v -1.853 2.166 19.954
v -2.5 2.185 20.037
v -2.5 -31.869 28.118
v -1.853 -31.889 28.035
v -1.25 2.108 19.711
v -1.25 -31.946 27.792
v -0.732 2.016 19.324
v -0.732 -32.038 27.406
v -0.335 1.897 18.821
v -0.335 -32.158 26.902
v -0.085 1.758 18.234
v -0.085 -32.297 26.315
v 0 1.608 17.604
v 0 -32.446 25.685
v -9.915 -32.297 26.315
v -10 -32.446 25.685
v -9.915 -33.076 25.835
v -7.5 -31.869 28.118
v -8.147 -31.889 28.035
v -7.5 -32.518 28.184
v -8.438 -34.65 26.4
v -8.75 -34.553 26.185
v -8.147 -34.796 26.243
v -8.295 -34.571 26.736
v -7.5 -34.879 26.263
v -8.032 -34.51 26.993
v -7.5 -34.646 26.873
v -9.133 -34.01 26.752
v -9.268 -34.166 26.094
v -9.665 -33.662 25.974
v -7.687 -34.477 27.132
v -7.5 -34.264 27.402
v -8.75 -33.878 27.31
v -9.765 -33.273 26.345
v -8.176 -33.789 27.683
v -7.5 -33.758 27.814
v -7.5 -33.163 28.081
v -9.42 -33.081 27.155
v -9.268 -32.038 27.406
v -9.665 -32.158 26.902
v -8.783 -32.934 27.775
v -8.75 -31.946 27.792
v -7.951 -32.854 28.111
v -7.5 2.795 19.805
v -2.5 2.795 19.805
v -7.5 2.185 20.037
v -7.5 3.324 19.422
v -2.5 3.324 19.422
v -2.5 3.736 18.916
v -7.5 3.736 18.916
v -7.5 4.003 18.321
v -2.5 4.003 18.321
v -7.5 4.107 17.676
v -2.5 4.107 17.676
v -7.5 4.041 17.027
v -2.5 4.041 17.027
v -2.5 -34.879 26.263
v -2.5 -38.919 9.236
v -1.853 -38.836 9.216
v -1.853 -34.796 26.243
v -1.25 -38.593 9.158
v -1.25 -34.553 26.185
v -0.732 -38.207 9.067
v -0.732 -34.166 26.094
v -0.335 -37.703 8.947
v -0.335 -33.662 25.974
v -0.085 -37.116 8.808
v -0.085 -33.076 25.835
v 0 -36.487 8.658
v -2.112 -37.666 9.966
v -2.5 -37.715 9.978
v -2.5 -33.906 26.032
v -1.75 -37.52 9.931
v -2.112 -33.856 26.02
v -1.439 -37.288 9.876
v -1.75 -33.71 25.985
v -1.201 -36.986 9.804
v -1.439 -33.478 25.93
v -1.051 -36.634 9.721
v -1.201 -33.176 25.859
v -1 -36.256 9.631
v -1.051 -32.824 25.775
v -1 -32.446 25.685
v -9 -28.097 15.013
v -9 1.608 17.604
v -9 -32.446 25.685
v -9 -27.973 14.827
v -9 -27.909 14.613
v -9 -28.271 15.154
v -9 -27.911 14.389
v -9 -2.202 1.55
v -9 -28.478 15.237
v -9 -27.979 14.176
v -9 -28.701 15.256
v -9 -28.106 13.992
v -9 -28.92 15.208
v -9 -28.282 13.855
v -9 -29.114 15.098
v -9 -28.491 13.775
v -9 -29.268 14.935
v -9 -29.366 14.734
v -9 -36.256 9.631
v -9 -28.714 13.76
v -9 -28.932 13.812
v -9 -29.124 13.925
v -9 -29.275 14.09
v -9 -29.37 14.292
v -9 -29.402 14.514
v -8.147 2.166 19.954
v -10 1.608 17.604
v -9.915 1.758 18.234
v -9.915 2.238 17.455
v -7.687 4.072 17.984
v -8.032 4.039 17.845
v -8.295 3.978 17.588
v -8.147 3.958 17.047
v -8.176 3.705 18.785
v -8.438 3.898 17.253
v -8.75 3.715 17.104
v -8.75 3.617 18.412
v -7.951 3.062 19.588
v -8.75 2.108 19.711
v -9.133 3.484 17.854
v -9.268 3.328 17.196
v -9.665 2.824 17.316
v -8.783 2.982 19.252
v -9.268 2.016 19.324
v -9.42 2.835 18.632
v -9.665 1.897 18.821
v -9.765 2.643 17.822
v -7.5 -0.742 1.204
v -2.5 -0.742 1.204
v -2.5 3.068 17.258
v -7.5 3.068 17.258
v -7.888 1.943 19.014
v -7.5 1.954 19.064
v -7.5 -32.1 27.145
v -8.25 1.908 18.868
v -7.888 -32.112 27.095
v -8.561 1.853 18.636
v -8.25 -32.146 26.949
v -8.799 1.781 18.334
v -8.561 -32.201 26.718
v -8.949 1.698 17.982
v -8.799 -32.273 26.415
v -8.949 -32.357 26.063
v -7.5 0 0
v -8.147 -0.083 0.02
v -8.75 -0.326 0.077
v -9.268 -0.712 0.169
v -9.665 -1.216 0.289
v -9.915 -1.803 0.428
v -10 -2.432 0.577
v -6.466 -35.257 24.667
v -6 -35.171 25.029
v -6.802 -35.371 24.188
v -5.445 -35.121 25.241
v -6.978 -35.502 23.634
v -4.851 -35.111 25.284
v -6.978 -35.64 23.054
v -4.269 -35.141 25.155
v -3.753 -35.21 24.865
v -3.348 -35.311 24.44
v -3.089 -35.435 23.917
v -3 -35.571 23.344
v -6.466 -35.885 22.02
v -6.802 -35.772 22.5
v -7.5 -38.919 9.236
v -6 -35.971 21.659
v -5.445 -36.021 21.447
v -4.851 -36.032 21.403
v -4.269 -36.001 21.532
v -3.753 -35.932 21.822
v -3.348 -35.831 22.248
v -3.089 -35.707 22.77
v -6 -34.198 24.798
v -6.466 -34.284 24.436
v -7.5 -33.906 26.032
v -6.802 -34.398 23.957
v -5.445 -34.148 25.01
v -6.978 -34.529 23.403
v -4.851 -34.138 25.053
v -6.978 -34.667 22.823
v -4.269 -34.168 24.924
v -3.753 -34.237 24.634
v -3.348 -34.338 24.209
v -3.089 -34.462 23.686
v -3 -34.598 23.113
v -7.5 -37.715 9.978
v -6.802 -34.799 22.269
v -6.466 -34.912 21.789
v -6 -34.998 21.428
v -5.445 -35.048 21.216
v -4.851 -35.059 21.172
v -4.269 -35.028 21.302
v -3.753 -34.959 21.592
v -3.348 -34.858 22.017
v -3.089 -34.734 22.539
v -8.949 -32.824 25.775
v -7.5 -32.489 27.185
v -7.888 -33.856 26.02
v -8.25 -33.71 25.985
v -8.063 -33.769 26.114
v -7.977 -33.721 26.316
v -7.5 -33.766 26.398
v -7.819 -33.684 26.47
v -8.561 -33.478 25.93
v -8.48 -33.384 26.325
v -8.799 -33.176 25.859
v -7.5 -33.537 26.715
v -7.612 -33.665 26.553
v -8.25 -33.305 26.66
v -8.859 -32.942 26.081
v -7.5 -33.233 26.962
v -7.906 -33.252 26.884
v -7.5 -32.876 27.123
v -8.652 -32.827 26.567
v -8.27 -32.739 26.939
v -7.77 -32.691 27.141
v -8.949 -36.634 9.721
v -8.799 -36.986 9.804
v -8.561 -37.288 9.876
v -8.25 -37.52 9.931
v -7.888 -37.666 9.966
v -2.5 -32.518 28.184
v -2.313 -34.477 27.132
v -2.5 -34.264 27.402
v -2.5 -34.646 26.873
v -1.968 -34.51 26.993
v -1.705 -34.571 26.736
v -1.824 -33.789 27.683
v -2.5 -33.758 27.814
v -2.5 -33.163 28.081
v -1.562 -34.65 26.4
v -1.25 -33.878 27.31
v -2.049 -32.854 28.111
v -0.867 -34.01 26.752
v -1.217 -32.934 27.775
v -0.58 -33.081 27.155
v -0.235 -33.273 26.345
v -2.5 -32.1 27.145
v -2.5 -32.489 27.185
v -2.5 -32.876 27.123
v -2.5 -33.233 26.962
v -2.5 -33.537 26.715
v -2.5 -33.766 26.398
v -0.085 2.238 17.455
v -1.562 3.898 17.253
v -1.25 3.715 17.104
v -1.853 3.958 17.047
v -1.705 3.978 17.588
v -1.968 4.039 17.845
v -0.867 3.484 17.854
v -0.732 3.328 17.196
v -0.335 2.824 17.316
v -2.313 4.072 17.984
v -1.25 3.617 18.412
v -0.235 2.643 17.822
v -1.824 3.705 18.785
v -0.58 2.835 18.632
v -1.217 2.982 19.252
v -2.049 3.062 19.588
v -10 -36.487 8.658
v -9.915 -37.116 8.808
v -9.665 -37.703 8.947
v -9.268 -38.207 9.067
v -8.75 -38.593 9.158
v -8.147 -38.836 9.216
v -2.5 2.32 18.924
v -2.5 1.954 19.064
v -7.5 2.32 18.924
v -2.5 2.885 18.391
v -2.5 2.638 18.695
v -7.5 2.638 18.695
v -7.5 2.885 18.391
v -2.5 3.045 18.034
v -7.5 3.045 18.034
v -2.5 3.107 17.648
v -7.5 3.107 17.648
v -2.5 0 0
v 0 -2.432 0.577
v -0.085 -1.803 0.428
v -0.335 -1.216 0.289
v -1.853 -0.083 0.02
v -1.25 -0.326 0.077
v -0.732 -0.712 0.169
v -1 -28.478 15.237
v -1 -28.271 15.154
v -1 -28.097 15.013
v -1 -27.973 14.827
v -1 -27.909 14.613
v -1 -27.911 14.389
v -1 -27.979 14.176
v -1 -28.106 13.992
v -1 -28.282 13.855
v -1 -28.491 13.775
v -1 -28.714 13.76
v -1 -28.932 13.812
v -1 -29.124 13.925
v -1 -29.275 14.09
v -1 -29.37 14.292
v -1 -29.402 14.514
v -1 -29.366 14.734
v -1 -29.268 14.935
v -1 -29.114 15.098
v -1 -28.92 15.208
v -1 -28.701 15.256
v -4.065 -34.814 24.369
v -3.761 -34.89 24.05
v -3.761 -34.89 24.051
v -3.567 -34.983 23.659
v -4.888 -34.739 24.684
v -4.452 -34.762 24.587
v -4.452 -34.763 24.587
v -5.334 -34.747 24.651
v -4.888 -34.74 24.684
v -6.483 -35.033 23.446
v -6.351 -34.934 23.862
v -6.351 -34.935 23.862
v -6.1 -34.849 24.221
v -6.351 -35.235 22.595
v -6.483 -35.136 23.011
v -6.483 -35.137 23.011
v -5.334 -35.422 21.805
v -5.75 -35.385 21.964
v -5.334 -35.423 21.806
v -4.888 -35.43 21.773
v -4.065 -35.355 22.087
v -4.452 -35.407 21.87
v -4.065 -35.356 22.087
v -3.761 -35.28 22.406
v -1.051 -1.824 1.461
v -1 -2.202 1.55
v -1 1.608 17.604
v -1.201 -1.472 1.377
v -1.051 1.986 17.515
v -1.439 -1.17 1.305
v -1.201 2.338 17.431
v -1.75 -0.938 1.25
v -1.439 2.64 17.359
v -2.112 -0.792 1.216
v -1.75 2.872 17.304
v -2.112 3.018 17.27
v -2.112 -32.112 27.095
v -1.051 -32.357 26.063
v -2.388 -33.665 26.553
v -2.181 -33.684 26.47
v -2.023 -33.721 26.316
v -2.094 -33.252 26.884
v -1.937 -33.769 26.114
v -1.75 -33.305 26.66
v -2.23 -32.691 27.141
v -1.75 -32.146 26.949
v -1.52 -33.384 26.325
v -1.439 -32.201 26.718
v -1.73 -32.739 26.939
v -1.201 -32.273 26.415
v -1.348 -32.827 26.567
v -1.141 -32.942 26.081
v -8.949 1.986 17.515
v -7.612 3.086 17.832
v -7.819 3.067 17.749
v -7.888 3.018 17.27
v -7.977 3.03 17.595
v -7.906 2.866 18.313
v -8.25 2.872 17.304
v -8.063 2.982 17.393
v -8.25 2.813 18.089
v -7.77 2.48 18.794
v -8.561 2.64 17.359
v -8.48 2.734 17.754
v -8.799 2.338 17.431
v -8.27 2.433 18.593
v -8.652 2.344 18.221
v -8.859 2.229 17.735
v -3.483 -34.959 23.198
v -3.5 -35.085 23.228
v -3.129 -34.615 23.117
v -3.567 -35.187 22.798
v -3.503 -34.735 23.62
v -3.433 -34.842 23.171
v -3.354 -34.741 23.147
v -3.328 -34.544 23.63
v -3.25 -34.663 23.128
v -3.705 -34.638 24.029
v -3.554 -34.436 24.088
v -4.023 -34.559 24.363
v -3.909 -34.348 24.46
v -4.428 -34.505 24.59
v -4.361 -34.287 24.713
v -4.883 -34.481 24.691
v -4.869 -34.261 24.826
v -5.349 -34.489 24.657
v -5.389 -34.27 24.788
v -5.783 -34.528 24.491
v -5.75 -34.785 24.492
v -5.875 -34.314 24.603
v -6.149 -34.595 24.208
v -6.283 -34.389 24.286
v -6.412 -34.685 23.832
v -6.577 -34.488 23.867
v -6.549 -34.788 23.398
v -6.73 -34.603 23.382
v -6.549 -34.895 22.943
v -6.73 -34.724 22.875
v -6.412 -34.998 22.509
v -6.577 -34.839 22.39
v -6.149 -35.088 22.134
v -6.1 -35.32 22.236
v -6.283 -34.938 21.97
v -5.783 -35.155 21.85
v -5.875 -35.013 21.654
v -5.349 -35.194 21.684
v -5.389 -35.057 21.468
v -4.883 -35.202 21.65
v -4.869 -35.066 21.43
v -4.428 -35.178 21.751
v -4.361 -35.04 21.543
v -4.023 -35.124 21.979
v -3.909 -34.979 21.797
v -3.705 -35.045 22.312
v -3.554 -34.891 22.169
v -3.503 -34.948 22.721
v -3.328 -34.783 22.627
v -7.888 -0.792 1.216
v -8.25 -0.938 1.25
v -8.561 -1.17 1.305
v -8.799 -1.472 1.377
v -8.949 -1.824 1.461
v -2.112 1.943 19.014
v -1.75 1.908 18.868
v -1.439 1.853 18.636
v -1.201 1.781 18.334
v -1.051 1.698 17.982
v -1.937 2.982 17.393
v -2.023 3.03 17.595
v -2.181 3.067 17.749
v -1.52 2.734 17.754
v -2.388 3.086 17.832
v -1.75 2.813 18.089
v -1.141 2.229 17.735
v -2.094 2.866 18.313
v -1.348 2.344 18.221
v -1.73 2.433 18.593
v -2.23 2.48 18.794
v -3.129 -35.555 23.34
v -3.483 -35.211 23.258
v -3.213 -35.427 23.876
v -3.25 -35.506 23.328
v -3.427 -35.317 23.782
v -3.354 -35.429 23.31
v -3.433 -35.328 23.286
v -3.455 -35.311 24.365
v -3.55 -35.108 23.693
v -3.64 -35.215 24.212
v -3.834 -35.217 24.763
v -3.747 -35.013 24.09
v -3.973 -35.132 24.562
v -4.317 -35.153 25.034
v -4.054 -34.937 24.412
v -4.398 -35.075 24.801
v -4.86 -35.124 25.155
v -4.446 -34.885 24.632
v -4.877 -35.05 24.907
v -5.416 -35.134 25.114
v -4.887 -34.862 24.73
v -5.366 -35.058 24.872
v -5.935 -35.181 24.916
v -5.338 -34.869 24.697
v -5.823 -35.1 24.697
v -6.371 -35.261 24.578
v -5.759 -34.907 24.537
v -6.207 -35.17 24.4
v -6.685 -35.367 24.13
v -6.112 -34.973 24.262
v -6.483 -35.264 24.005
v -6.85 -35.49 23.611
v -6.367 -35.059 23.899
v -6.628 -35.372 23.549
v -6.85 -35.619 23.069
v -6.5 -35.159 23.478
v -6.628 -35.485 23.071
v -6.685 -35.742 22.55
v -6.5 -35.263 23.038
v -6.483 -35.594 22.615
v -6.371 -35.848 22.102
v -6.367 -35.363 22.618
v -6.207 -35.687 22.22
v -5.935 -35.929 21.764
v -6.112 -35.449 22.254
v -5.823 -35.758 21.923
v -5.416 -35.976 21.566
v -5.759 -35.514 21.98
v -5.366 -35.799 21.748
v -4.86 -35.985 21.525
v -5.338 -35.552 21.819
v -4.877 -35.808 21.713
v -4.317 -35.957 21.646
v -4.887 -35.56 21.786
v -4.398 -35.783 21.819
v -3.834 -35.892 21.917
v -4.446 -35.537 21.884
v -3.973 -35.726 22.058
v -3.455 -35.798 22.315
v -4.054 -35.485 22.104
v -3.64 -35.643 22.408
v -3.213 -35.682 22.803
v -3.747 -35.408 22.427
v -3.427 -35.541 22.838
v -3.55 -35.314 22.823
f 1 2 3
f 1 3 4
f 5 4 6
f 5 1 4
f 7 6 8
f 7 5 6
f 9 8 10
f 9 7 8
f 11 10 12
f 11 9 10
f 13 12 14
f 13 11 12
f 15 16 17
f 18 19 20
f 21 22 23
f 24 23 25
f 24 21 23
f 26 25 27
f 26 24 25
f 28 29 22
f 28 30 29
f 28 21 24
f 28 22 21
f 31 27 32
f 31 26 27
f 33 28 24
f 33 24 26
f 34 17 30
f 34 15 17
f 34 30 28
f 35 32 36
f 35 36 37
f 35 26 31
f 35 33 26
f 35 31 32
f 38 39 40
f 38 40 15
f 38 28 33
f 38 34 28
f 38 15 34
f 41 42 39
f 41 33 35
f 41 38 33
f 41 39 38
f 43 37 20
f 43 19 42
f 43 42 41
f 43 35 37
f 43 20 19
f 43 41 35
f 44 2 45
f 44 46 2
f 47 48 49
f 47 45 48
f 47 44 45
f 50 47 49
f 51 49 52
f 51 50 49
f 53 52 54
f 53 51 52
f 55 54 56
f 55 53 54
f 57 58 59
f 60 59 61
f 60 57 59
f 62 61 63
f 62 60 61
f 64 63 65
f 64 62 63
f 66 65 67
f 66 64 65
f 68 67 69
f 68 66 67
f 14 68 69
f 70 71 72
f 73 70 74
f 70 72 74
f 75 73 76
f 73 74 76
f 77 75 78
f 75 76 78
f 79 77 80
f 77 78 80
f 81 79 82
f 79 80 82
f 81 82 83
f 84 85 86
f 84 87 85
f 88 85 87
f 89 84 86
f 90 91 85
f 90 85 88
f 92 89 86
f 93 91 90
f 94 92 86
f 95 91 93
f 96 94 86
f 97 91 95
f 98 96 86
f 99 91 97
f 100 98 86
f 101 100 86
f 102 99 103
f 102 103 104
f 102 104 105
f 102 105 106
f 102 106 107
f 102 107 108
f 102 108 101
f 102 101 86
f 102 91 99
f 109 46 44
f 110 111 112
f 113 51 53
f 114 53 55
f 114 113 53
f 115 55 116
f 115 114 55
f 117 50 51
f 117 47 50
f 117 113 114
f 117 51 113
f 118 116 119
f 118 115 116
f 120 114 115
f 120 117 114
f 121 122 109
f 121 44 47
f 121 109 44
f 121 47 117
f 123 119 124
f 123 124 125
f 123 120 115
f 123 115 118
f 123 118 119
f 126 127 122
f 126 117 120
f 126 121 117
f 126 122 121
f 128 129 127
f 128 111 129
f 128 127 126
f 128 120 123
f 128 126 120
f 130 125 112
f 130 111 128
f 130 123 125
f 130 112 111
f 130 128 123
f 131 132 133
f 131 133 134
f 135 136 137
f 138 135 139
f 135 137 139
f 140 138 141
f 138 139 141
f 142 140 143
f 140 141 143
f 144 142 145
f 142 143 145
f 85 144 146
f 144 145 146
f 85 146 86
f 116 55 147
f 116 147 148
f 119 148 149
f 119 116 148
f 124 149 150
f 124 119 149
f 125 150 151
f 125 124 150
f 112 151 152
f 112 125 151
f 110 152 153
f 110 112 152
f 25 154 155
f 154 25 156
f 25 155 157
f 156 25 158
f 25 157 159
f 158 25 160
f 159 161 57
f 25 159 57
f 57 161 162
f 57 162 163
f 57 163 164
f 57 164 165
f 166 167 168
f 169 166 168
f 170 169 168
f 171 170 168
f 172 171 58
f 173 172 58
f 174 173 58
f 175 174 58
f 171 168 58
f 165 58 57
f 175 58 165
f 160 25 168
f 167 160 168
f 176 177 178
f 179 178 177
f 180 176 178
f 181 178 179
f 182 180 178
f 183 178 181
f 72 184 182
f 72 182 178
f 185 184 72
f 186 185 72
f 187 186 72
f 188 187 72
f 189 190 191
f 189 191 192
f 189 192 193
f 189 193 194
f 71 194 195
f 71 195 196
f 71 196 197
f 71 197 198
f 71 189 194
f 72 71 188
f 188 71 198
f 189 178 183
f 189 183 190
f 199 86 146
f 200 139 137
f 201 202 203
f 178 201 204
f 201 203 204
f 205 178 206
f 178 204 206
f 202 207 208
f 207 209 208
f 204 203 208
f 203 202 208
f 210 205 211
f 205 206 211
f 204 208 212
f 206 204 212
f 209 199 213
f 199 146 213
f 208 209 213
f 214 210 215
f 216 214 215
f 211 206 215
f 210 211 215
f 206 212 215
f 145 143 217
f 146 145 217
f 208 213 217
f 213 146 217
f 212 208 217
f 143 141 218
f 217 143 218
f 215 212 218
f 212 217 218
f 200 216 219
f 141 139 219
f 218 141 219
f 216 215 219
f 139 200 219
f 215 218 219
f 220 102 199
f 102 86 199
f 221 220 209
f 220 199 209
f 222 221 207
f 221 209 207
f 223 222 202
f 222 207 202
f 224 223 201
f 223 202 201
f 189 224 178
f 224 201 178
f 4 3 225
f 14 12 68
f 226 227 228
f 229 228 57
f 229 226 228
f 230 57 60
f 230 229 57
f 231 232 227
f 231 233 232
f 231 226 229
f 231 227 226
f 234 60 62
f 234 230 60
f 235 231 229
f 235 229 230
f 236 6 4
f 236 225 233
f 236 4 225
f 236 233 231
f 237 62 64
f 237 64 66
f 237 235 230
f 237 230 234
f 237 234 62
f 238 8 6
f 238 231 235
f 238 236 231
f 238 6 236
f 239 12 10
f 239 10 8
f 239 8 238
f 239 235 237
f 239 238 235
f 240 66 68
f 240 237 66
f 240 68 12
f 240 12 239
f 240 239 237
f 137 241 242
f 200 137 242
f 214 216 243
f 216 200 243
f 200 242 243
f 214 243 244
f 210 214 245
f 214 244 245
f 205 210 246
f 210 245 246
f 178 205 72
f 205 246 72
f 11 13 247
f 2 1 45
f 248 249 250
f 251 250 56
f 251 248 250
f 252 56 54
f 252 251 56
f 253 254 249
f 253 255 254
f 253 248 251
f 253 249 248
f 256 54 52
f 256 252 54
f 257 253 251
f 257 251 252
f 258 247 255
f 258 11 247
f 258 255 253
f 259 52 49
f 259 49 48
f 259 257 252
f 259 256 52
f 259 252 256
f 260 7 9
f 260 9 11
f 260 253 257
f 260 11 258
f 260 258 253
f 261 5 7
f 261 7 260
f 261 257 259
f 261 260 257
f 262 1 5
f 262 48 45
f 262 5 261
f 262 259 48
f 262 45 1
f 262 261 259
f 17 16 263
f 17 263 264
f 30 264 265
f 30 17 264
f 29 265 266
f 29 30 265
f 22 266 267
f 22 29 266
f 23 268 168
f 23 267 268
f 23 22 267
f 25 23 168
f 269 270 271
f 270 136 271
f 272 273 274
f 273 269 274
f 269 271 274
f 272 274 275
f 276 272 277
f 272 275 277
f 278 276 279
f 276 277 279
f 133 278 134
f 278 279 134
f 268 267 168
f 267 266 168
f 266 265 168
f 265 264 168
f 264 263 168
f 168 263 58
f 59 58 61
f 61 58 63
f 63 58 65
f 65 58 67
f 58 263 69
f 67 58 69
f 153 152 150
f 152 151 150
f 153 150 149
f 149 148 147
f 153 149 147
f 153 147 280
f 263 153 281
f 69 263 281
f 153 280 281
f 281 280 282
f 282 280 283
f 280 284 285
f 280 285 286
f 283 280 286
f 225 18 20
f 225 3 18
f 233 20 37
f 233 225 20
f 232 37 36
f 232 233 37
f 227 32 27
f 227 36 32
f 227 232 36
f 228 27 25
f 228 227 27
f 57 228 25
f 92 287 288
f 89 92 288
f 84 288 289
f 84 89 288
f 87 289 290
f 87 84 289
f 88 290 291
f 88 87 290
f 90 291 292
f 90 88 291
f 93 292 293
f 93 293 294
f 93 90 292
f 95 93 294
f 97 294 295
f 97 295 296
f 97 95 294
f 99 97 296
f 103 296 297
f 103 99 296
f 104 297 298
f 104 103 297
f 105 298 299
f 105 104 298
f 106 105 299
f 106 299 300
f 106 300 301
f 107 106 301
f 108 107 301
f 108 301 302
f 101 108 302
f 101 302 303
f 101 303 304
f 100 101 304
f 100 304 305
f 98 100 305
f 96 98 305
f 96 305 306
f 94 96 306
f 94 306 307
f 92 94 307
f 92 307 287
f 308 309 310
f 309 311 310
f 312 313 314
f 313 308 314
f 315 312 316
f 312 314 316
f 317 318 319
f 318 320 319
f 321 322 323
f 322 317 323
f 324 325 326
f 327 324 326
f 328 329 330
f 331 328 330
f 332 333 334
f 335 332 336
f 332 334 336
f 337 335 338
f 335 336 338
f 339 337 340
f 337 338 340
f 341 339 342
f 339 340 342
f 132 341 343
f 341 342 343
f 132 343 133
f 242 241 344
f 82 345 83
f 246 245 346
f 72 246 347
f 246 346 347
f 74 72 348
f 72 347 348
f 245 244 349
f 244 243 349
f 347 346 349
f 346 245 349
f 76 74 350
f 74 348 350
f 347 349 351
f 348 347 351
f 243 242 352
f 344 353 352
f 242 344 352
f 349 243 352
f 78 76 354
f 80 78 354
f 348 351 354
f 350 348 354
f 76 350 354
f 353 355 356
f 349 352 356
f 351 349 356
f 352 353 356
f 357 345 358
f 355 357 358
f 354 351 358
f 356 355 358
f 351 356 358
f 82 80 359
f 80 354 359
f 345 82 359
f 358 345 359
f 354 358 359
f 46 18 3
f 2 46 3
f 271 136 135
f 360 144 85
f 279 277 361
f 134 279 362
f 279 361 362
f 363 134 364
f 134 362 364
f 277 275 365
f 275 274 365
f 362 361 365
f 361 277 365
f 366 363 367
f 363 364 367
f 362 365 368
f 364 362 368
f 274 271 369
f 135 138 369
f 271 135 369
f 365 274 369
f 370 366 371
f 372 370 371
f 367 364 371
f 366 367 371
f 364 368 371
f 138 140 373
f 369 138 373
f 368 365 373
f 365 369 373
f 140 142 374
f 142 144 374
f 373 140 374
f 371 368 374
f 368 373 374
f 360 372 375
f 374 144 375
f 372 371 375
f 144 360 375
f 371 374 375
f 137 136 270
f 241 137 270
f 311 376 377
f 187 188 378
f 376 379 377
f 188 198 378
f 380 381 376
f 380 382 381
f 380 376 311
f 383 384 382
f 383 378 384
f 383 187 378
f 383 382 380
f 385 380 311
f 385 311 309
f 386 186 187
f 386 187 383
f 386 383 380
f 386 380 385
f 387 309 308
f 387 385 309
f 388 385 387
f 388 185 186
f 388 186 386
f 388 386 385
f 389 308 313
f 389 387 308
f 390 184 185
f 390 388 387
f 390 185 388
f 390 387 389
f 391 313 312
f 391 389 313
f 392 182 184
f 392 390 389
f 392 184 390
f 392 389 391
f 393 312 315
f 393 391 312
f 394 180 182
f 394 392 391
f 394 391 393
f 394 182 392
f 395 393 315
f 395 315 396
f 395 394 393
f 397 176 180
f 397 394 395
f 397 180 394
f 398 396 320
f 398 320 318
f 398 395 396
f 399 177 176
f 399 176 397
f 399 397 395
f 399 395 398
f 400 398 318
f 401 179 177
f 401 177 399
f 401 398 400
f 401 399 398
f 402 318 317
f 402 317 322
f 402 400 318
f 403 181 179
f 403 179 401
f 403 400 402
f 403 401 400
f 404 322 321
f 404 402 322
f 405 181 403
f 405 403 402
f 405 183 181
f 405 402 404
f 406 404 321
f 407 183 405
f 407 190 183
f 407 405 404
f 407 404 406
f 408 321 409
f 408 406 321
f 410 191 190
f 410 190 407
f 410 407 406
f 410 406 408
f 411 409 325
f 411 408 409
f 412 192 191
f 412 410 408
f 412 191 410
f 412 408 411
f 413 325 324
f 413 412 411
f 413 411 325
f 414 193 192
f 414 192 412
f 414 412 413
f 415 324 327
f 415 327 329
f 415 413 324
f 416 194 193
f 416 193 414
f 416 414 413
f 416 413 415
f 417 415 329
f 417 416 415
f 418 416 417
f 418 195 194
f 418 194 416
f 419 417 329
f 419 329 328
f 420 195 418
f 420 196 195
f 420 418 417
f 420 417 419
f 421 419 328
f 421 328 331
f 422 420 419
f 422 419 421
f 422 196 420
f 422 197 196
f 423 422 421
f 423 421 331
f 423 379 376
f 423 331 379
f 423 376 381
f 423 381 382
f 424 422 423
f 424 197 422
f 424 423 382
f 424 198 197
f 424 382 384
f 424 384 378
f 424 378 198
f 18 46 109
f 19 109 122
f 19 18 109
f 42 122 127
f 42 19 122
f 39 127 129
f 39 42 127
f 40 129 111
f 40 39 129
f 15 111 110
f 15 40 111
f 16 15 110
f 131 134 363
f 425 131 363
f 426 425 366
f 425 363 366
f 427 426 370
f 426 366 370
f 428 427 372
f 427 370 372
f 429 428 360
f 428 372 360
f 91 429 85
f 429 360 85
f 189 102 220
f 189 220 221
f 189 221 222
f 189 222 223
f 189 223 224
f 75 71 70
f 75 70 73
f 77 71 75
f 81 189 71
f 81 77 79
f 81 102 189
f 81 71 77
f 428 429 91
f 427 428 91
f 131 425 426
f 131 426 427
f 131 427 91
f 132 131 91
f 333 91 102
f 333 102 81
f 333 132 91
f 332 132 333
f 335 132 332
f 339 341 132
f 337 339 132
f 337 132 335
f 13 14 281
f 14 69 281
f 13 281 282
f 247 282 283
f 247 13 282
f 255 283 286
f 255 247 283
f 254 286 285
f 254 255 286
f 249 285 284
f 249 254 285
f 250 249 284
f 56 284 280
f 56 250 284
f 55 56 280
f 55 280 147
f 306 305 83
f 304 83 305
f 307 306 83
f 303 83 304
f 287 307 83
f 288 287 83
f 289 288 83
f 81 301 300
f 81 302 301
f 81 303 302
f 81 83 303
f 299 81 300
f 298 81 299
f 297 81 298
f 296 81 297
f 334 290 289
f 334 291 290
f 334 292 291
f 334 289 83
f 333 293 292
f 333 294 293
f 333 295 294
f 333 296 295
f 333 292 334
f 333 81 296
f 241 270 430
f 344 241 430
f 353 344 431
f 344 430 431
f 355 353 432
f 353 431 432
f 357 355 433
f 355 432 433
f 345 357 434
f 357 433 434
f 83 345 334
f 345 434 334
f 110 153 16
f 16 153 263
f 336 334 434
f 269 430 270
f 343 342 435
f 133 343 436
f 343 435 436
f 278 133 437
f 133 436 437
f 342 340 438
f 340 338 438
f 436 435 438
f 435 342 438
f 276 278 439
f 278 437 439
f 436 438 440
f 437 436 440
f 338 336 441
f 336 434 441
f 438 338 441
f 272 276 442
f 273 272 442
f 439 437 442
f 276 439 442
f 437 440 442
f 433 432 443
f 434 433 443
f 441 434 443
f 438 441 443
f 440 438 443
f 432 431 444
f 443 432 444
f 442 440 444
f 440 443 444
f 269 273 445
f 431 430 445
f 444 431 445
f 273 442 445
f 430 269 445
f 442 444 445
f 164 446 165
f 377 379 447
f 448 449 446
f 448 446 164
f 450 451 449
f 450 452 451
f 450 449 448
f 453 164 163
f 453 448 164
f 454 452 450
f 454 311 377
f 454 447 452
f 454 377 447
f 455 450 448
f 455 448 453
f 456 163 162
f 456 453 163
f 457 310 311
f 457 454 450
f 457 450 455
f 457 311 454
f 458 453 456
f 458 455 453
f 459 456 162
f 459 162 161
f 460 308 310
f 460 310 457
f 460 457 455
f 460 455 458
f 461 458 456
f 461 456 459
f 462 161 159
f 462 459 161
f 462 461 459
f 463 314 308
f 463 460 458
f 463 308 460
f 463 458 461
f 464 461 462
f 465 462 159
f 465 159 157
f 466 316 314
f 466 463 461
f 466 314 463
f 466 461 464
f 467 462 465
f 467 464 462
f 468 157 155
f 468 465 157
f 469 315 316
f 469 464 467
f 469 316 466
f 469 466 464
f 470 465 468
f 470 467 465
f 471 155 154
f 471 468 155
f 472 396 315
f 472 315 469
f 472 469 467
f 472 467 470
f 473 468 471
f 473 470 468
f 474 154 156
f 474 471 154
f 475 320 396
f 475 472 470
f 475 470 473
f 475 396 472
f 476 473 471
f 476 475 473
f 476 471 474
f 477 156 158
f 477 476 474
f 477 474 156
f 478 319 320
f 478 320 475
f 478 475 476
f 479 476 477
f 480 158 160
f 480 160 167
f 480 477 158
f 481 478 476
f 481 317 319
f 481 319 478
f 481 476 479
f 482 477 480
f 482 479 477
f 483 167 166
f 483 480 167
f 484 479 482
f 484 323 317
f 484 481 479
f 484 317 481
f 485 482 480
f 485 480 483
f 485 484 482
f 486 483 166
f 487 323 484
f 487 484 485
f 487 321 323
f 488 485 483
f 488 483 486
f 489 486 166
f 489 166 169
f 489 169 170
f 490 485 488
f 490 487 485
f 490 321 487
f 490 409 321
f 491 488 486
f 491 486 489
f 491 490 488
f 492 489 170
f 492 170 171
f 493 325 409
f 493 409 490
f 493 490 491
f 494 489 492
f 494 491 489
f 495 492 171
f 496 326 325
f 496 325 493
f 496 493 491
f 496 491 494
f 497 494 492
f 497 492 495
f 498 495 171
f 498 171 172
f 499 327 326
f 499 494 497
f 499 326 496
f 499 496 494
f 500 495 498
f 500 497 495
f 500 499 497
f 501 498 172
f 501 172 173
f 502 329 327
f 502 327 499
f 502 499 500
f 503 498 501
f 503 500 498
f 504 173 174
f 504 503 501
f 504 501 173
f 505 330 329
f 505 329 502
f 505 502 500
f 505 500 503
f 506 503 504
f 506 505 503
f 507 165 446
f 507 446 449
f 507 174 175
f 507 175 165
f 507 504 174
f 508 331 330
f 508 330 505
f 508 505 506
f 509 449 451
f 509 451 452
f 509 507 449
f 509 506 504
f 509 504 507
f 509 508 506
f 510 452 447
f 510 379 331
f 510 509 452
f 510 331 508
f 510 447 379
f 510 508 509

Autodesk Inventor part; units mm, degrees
ref_plane "YZ Plane" through (0, 0, 0) normal (1, 0, 0) x (0, 1, 0)
ref_plane "XZ Plane" through (0, 0, 0) normal (0, 1, 0) x (-1, 0, 0)
sketch "Sketch1" plane through (0, 0, 0) normal (1, 0, 0) x (0, 1, 0)
  line L0 (0, 0) -> (67.821, 0)
  line L1 (67.821, 0) -> (67.821, -16.094)
  line L2 (67.821, -16.094) -> (0, -16.094)
  line L3 (0, -16.094) -> (0, 0)
  line L4 (67.821, -16.094) -> (0, 0)
  dimension "d0" = 67.821
  dimension "d1" = 16.094
ref_plane "Work Plane1" through (0, 0, 0) normal (0, 0.2308893, 0.97298) x (1, 0, 0)
sketch "Sketch4" plane through (0, 0, 0) normal (0, 0.2308893, 0.97298) x (1, 0, 0)
  line L0 (0, 0) -> (-10, 0)
  line L1 (-10, 0) -> (-10, -40)
  line L2 (-10, -40) -> (0, -40)
  line L3 (0, -40) -> (0, 0)
  dimension "d16" = 40
  dimension "d17" = 10
extrude "Extrusion4" add sketch "Sketch4" along normal blind 20
fillet "Fillet3" radius 2.5 8 edges at (0, -14.8418, 24.0774) (-10, -14.8418, 24.0774) (-5, 4.6178, 19.4596) (-10, 2.3089, 9.7298) (0, 2.3089, 9.7298) (0, -36.6103, 18.9654) (-5, -34.3014, 28.6952) (-10, -36.6103, 18.9654)
shell "Shell2" thickness 1 removed faces 0
sketch "Sketch5" plane through (-7.5, -38.9192, 9.2356) normal (0, -0.97298, 0.2308893) x (1, 0, 0)
  line L0 (0, 0) -> (0, 17.5) projected
  line L1 (0, 0) -> (5, 0) projected
  line L2 (5, 17.5) -> (5, 0) projected
  line L3 (0, 17.5) -> (5, 17.5) projected
  circle A0 centre (2.5, 14.5) radius 1.5
  point P0 (7.5, 0)
  point P1 (2.5, 17.5)
  dimension "d22" = 3
  dimension "d23" = 3
extrude "Extrusion5" cut sketch "Sketch5" against normal blind 2 contours A0
fillet "Fillet4" radius 0.5 2 edges at (-6.5, -34.5983, 23.1129) (-6.5, -35.5713, 23.3438)
sketch "Sketch6" plane through (0, -36.4868, 8.6583) normal (1, 0, 0) x (0, -0.2308893, -0.97298)
  line L0 (-17.5, 35) -> (0, 35) projected
  line L1 (-17.5, 0) -> (-17.5, 35) projected
  line L2 (0, 0) -> (-17.5, 0) projected
  line L3 (0, 0) -> (0, 35) projected
  point P0 (0, 37.5)
  dimension "d27" = 35
  dimension "d28" = 17.5
sketch "Sketch7" plane through (-10, -36.4868, 8.6583) normal (-1, 0, 0) x (0, 0.2308893, 0.97298)
  line L0 (0, -2.5) -> (17.5, -2.5) projected
  line L1 (20, 0) -> (20, 35) projected
  line L2 (20, -2.5) -> (6.9383, -2.5)
  line L3 (7.5, 6.273) -> (20, 6.273)
  line L4 (20, 6.273) -> (20, -2.5)
  line L5 (0, -2.5) -> (20, -2.5)
  line L6 (12.5, -2.5) -> (16.5, -2.5) projected
  line L7 (20, 6.273) -> (20, -2.5)
  line L8 (20, -2.5) -> (20, 16.6364)
  line L9 (20, 35) -> (20, 0) projected
  line L10 (7.5, 6.273) -> (7.5, -2.5)
  circle A0 centre (7.5, 6.273) radius 0.75
  point P0 (0, 37.5)
  dimension "d29" = 12.5
  dimension "d30" = 8.773
  dimension "d31" = 1.5
extrude "Extrusion6" add sketch "Sketch7" against normal blind 10 contours A0 L3 L10 | L10 L3 A0
properties part number "caja de los actuadores"
